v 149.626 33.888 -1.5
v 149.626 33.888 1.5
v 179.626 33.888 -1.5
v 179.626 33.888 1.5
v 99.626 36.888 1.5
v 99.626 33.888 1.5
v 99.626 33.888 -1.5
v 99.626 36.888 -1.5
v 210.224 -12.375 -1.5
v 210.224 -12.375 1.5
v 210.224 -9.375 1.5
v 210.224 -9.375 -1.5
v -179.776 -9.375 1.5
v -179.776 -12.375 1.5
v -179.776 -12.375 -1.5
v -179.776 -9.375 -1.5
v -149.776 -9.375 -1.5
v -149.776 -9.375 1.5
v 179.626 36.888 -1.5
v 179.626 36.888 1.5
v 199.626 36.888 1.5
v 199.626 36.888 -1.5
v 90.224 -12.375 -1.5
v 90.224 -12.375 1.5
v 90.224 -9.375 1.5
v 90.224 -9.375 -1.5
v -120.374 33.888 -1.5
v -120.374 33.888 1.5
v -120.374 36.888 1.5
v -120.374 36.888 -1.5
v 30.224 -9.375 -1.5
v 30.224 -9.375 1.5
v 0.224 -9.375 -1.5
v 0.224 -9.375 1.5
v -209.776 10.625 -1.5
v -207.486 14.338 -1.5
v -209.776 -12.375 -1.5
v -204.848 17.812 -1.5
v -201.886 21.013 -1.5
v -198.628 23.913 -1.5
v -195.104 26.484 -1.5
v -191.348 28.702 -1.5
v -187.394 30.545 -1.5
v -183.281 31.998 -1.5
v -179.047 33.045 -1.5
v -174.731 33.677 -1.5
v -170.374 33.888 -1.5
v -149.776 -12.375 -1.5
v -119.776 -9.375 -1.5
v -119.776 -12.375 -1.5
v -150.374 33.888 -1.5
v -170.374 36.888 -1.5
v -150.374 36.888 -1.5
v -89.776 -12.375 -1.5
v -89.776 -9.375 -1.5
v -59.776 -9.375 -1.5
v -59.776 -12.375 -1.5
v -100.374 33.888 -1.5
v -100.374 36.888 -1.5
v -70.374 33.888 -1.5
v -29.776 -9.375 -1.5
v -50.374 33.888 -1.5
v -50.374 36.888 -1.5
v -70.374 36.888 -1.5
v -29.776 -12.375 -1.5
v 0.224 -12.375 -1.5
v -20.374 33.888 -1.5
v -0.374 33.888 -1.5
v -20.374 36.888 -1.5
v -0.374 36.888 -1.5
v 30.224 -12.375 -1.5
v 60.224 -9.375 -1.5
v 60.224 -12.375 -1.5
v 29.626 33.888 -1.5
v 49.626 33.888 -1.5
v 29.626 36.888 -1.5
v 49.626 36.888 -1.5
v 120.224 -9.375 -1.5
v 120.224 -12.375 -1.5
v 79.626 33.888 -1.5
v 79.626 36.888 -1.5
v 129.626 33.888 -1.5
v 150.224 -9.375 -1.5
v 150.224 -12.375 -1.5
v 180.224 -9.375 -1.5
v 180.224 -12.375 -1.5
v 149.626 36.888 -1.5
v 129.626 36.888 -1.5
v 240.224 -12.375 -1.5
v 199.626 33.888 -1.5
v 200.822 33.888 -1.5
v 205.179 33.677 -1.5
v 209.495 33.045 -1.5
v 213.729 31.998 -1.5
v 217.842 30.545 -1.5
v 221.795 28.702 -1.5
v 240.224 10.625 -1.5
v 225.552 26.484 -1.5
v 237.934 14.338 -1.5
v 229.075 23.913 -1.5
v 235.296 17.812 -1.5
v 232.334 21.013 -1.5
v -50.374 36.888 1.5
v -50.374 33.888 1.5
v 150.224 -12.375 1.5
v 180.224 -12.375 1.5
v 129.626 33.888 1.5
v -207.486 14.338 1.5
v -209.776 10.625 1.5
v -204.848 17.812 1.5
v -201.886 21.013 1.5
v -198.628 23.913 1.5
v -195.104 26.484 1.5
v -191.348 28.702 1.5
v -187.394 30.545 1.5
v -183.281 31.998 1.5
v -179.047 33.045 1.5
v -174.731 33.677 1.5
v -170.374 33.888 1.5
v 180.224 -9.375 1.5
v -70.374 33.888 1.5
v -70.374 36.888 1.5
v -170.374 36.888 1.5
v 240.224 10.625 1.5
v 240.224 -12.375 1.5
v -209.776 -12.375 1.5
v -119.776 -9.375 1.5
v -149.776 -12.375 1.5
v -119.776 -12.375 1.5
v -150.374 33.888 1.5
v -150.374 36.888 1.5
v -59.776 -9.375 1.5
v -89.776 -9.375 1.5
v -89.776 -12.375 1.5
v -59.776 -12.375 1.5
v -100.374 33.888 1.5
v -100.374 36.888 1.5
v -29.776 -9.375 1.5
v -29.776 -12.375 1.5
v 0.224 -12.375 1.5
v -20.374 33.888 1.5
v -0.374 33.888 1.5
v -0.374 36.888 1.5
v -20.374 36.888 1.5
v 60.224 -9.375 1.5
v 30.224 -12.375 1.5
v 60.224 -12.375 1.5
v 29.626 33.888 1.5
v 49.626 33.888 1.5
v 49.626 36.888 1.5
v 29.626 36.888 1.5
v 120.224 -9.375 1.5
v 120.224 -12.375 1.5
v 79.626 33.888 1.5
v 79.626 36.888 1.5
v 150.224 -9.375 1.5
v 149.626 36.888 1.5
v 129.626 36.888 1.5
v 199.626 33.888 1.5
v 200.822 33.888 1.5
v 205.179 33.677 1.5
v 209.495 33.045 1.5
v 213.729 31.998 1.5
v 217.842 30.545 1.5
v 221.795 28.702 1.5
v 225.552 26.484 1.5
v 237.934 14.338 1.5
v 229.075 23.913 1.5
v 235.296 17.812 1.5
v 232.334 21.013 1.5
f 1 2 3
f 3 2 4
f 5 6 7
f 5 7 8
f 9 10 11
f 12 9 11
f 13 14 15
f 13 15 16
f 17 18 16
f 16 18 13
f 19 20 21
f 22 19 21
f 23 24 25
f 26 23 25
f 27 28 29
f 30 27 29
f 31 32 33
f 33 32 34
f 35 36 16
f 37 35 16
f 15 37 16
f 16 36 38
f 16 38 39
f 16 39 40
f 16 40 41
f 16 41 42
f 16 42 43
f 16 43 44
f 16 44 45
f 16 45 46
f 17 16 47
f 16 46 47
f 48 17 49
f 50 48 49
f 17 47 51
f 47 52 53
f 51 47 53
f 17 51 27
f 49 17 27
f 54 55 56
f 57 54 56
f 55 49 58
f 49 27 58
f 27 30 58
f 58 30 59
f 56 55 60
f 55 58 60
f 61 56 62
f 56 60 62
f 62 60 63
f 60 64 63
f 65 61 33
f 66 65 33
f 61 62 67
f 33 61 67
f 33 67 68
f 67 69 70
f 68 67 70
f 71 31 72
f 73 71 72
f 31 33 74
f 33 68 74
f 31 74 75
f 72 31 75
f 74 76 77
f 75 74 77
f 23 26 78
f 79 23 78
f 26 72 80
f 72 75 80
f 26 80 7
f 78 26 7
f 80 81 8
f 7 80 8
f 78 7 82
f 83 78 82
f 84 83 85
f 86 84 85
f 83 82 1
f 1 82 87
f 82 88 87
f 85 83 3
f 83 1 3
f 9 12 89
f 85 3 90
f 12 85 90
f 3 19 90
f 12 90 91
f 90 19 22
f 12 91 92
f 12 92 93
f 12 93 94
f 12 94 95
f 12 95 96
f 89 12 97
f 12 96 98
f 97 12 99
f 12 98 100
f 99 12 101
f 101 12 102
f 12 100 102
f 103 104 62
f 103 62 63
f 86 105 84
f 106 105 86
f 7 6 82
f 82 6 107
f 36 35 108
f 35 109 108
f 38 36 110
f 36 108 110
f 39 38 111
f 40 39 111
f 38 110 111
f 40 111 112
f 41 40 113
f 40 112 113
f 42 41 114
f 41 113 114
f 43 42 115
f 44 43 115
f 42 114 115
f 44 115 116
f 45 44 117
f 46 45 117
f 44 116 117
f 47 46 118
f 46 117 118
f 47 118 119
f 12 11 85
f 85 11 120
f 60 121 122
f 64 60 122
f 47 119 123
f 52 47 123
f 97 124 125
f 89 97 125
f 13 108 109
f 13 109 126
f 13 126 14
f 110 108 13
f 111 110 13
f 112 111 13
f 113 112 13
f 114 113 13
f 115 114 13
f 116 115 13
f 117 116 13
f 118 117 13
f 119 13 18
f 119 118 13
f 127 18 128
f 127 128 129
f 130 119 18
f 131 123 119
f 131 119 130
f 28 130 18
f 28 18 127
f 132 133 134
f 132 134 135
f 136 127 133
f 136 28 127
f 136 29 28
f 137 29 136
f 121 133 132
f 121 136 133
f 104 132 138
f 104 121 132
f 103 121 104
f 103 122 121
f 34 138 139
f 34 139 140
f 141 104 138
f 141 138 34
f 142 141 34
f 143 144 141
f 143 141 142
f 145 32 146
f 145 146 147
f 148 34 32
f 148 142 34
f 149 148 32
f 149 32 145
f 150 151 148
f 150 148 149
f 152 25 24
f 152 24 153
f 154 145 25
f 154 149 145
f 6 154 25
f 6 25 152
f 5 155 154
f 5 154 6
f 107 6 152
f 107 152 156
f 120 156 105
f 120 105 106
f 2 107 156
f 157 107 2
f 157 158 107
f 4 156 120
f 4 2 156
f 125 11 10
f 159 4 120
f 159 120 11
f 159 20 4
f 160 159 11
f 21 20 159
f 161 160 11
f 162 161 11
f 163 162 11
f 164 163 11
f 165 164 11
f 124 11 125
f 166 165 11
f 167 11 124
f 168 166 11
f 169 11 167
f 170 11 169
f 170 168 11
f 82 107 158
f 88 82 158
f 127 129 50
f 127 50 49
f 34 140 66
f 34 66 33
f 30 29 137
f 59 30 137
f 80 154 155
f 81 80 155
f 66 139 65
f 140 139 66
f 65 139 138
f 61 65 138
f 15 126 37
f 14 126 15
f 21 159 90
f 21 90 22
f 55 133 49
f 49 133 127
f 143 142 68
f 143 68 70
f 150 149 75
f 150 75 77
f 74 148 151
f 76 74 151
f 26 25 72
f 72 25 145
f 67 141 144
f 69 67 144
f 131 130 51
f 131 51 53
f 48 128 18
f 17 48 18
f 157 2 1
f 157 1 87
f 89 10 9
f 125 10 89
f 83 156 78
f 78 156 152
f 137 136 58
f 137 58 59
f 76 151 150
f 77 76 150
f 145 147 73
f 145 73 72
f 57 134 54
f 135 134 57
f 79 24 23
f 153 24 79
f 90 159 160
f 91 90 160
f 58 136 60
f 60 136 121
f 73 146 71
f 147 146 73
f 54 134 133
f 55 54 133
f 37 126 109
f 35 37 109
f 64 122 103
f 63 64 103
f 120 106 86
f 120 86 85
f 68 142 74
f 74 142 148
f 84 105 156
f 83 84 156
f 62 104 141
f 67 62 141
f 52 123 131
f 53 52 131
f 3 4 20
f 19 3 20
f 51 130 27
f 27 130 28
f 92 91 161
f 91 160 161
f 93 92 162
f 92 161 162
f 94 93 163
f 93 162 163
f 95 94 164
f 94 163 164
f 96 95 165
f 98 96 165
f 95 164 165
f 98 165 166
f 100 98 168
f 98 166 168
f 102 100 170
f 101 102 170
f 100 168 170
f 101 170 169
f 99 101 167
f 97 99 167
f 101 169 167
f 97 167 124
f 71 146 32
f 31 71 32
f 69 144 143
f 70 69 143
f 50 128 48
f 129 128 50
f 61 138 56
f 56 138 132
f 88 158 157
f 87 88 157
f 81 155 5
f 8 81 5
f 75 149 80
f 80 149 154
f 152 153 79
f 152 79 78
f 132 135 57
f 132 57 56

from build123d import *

# Parameters (mm, degrees)
BOSS_EXTRUDE1_DEPTH = 1.5
SKETCH3_W           = 30
SKETCH3_H           = 3
BOSS_EXTRUDE2_DEPTH = 3
SKETCH5_W           = 20
SKETCH5_H           = 3
BOSS_EXTRUDE3_DEPTH = 3


with BuildPart() as part:
    # Sketch2 → Boss-Extrude1 (new, symmetric)
    with BuildSketch(Plane.XY):
        with BuildLine():
            Line((-209.776110705, -9.374567854), (-209.776110705, 10.625432146))
            ThreePointArc((-209.776110705, 10.625432146), (-193.252620605, 27.63865465), (-170.374325813, 33.888382039))
            Line((-170.374325813, 33.888382039), (200.822104404, 33.888382039))
            ThreePointArc((200.822104404, 33.888382039), (223.700399196, 27.63865465), (240.223889295, 10.625432146))
            Line((240.223889295, 10.625432146), (240.223889295, -9.374567854))
            Line((240.223889295, -9.374567854), (-209.776110705, -9.374567854))
        make_face()
    extrude(amount=BOSS_EXTRUDE1_DEPTH, both=True)

    # Sketch3 → Boss-Extrude2 (add)
    with BuildSketch(Plane.XY.offset(1.5)):
        with Locations((-134.776110705, -10.874567854)):
            Rectangle(SKETCH3_W, SKETCH3_H)
        with Locations((-194.776110705, -10.874567854)):
            Rectangle(SKETCH3_W, SKETCH3_H)
        with Locations((-74.776110705, -10.874567854)):
            Rectangle(SKETCH3_W, SKETCH3_H)
        with Locations((-14.776110705, -10.874567854)):
            Rectangle(SKETCH3_W, SKETCH3_H)
        with Locations((45.223889295, -10.874567854)):
            Rectangle(SKETCH3_W, SKETCH3_H)
        with Locations((105.223889295, -10.874567854)):
            Rectangle(SKETCH3_W, SKETCH3_H)
        with Locations((165.223889295, -10.874567854)):
            Rectangle(SKETCH3_W, SKETCH3_H)
        with Locations((225.223889295, -10.874567854)):
            Rectangle(SKETCH3_W, SKETCH3_H)
    extrude(amount=-BOSS_EXTRUDE2_DEPTH)

    # Sketch5 → Boss-Extrude3 (add)
    with BuildSketch(Plane.XY.offset(1.5)):
        with Locations((-160.374325813, 35.388382039)):
            Rectangle(SKETCH5_W, SKETCH5_H)
        with Locations((-110.374325813, 35.388382039)):
            Rectangle(SKETCH5_W, SKETCH5_H)
        with Locations((-60.374325813, 35.388382039)):
            Rectangle(SKETCH5_W, SKETCH5_H)
        with Locations((-10.374325813, 35.388382039)):
            Rectangle(SKETCH5_W, SKETCH5_H)
        with Locations((39.625674187, 35.388382039)):
            Rectangle(SKETCH5_W, SKETCH5_H)
        with Locations((89.625674187, 35.388382039)):
            Rectangle(SKETCH5_W, SKETCH5_H)
        with Locations((139.625674187, 35.388382039)):
            Rectangle(SKETCH5_W, SKETCH5_H)
        with Locations((189.625674187, 35.388382039)):
            Rectangle(SKETCH5_W, SKETCH5_H)
    extrude(amount=-BOSS_EXTRUDE3_DEPTH)


solid = part.part
